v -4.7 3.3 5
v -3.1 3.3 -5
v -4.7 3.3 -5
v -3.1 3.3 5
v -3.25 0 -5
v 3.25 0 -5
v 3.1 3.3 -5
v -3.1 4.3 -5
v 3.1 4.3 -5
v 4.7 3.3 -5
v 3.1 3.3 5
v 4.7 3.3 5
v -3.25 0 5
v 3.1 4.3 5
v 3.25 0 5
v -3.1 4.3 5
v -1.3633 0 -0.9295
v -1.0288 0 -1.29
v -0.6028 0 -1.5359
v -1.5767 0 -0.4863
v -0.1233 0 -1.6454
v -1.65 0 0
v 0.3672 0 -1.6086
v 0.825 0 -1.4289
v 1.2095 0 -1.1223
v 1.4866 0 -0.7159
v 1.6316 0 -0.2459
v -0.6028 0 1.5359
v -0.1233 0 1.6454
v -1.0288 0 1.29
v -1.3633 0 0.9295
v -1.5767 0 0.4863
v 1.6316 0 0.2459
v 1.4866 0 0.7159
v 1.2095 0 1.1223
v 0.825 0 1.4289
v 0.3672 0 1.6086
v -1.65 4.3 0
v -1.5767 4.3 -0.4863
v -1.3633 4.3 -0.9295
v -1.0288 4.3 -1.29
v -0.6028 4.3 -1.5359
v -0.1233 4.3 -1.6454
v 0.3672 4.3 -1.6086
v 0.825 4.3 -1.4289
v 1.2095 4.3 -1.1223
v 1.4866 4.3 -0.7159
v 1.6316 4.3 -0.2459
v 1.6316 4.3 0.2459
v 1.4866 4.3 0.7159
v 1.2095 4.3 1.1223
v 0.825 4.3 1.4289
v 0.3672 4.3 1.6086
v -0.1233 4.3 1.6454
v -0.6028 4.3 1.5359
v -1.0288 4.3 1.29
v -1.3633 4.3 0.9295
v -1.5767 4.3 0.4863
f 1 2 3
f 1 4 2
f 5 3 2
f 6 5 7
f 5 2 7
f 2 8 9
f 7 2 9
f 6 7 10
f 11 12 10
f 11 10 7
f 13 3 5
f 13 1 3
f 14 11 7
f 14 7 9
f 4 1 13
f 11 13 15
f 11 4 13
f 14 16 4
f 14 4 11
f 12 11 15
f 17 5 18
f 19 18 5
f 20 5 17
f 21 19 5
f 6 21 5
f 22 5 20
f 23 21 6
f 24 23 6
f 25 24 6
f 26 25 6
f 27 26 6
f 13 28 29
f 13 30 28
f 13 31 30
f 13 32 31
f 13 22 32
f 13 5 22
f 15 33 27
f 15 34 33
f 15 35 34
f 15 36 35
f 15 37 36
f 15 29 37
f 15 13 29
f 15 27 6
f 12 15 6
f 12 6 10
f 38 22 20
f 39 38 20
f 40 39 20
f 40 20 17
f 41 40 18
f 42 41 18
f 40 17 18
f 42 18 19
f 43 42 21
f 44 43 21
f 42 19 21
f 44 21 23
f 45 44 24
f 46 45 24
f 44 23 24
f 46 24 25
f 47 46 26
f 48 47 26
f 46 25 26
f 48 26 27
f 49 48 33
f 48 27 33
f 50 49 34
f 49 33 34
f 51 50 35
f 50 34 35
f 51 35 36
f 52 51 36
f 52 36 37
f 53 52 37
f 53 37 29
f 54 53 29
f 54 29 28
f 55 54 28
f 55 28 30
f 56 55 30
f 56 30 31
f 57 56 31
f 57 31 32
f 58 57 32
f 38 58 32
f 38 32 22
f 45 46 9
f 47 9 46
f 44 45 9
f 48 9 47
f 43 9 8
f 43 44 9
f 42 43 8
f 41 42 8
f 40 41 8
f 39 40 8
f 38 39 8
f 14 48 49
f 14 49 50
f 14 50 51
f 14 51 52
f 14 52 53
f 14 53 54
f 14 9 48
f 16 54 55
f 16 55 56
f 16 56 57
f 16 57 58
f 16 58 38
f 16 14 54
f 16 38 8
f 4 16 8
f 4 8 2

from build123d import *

# Parameters (mm, degrees)
BOSS_EXTRUDE1_DEPTH       = 5
M4X0_7_TAPPED_HOLE2_D     = 3.3
M4X0_7_TAPPED_HOLE2_DEPTH = 11.5
M4X0_7_TAPPED_HOLE2_TIP   = 0.991420021


with BuildPart() as part:
    # Sketch1 → Boss-Extrude1 (new, symmetric)
    with BuildSketch(Plane.XY):
        Polygon((-3.25, 0), (3.25, 0), (4.7, 3.3), (3.1, 3.3), (3.1, 4.3), (-3.1, 4.3), (-3.1, 3.3), (-4.7, 3.3), align=None)
    extrude(amount=BOSS_EXTRUDE1_DEPTH, both=True)

    # M4x0.7 Tapped Hole2
    with Locations(Plane(origin=(0, 4.3, 0), x_dir=(1, 0, 0), z_dir=(0, 1, 0))):
        with Locations((0, 0)):
            Hole(M4X0_7_TAPPED_HOLE2_D / 2, depth=M4X0_7_TAPPED_HOLE2_DEPTH)
            with Locations((0, 0, -(M4X0_7_TAPPED_HOLE2_DEPTH + M4X0_7_TAPPED_HOLE2_TIP / 2))):  # 118° drill point
                Cone(0, M4X0_7_TAPPED_HOLE2_D / 2, M4X0_7_TAPPED_HOLE2_TIP, mode=Mode.SUBTRACT)


solid = part.part
